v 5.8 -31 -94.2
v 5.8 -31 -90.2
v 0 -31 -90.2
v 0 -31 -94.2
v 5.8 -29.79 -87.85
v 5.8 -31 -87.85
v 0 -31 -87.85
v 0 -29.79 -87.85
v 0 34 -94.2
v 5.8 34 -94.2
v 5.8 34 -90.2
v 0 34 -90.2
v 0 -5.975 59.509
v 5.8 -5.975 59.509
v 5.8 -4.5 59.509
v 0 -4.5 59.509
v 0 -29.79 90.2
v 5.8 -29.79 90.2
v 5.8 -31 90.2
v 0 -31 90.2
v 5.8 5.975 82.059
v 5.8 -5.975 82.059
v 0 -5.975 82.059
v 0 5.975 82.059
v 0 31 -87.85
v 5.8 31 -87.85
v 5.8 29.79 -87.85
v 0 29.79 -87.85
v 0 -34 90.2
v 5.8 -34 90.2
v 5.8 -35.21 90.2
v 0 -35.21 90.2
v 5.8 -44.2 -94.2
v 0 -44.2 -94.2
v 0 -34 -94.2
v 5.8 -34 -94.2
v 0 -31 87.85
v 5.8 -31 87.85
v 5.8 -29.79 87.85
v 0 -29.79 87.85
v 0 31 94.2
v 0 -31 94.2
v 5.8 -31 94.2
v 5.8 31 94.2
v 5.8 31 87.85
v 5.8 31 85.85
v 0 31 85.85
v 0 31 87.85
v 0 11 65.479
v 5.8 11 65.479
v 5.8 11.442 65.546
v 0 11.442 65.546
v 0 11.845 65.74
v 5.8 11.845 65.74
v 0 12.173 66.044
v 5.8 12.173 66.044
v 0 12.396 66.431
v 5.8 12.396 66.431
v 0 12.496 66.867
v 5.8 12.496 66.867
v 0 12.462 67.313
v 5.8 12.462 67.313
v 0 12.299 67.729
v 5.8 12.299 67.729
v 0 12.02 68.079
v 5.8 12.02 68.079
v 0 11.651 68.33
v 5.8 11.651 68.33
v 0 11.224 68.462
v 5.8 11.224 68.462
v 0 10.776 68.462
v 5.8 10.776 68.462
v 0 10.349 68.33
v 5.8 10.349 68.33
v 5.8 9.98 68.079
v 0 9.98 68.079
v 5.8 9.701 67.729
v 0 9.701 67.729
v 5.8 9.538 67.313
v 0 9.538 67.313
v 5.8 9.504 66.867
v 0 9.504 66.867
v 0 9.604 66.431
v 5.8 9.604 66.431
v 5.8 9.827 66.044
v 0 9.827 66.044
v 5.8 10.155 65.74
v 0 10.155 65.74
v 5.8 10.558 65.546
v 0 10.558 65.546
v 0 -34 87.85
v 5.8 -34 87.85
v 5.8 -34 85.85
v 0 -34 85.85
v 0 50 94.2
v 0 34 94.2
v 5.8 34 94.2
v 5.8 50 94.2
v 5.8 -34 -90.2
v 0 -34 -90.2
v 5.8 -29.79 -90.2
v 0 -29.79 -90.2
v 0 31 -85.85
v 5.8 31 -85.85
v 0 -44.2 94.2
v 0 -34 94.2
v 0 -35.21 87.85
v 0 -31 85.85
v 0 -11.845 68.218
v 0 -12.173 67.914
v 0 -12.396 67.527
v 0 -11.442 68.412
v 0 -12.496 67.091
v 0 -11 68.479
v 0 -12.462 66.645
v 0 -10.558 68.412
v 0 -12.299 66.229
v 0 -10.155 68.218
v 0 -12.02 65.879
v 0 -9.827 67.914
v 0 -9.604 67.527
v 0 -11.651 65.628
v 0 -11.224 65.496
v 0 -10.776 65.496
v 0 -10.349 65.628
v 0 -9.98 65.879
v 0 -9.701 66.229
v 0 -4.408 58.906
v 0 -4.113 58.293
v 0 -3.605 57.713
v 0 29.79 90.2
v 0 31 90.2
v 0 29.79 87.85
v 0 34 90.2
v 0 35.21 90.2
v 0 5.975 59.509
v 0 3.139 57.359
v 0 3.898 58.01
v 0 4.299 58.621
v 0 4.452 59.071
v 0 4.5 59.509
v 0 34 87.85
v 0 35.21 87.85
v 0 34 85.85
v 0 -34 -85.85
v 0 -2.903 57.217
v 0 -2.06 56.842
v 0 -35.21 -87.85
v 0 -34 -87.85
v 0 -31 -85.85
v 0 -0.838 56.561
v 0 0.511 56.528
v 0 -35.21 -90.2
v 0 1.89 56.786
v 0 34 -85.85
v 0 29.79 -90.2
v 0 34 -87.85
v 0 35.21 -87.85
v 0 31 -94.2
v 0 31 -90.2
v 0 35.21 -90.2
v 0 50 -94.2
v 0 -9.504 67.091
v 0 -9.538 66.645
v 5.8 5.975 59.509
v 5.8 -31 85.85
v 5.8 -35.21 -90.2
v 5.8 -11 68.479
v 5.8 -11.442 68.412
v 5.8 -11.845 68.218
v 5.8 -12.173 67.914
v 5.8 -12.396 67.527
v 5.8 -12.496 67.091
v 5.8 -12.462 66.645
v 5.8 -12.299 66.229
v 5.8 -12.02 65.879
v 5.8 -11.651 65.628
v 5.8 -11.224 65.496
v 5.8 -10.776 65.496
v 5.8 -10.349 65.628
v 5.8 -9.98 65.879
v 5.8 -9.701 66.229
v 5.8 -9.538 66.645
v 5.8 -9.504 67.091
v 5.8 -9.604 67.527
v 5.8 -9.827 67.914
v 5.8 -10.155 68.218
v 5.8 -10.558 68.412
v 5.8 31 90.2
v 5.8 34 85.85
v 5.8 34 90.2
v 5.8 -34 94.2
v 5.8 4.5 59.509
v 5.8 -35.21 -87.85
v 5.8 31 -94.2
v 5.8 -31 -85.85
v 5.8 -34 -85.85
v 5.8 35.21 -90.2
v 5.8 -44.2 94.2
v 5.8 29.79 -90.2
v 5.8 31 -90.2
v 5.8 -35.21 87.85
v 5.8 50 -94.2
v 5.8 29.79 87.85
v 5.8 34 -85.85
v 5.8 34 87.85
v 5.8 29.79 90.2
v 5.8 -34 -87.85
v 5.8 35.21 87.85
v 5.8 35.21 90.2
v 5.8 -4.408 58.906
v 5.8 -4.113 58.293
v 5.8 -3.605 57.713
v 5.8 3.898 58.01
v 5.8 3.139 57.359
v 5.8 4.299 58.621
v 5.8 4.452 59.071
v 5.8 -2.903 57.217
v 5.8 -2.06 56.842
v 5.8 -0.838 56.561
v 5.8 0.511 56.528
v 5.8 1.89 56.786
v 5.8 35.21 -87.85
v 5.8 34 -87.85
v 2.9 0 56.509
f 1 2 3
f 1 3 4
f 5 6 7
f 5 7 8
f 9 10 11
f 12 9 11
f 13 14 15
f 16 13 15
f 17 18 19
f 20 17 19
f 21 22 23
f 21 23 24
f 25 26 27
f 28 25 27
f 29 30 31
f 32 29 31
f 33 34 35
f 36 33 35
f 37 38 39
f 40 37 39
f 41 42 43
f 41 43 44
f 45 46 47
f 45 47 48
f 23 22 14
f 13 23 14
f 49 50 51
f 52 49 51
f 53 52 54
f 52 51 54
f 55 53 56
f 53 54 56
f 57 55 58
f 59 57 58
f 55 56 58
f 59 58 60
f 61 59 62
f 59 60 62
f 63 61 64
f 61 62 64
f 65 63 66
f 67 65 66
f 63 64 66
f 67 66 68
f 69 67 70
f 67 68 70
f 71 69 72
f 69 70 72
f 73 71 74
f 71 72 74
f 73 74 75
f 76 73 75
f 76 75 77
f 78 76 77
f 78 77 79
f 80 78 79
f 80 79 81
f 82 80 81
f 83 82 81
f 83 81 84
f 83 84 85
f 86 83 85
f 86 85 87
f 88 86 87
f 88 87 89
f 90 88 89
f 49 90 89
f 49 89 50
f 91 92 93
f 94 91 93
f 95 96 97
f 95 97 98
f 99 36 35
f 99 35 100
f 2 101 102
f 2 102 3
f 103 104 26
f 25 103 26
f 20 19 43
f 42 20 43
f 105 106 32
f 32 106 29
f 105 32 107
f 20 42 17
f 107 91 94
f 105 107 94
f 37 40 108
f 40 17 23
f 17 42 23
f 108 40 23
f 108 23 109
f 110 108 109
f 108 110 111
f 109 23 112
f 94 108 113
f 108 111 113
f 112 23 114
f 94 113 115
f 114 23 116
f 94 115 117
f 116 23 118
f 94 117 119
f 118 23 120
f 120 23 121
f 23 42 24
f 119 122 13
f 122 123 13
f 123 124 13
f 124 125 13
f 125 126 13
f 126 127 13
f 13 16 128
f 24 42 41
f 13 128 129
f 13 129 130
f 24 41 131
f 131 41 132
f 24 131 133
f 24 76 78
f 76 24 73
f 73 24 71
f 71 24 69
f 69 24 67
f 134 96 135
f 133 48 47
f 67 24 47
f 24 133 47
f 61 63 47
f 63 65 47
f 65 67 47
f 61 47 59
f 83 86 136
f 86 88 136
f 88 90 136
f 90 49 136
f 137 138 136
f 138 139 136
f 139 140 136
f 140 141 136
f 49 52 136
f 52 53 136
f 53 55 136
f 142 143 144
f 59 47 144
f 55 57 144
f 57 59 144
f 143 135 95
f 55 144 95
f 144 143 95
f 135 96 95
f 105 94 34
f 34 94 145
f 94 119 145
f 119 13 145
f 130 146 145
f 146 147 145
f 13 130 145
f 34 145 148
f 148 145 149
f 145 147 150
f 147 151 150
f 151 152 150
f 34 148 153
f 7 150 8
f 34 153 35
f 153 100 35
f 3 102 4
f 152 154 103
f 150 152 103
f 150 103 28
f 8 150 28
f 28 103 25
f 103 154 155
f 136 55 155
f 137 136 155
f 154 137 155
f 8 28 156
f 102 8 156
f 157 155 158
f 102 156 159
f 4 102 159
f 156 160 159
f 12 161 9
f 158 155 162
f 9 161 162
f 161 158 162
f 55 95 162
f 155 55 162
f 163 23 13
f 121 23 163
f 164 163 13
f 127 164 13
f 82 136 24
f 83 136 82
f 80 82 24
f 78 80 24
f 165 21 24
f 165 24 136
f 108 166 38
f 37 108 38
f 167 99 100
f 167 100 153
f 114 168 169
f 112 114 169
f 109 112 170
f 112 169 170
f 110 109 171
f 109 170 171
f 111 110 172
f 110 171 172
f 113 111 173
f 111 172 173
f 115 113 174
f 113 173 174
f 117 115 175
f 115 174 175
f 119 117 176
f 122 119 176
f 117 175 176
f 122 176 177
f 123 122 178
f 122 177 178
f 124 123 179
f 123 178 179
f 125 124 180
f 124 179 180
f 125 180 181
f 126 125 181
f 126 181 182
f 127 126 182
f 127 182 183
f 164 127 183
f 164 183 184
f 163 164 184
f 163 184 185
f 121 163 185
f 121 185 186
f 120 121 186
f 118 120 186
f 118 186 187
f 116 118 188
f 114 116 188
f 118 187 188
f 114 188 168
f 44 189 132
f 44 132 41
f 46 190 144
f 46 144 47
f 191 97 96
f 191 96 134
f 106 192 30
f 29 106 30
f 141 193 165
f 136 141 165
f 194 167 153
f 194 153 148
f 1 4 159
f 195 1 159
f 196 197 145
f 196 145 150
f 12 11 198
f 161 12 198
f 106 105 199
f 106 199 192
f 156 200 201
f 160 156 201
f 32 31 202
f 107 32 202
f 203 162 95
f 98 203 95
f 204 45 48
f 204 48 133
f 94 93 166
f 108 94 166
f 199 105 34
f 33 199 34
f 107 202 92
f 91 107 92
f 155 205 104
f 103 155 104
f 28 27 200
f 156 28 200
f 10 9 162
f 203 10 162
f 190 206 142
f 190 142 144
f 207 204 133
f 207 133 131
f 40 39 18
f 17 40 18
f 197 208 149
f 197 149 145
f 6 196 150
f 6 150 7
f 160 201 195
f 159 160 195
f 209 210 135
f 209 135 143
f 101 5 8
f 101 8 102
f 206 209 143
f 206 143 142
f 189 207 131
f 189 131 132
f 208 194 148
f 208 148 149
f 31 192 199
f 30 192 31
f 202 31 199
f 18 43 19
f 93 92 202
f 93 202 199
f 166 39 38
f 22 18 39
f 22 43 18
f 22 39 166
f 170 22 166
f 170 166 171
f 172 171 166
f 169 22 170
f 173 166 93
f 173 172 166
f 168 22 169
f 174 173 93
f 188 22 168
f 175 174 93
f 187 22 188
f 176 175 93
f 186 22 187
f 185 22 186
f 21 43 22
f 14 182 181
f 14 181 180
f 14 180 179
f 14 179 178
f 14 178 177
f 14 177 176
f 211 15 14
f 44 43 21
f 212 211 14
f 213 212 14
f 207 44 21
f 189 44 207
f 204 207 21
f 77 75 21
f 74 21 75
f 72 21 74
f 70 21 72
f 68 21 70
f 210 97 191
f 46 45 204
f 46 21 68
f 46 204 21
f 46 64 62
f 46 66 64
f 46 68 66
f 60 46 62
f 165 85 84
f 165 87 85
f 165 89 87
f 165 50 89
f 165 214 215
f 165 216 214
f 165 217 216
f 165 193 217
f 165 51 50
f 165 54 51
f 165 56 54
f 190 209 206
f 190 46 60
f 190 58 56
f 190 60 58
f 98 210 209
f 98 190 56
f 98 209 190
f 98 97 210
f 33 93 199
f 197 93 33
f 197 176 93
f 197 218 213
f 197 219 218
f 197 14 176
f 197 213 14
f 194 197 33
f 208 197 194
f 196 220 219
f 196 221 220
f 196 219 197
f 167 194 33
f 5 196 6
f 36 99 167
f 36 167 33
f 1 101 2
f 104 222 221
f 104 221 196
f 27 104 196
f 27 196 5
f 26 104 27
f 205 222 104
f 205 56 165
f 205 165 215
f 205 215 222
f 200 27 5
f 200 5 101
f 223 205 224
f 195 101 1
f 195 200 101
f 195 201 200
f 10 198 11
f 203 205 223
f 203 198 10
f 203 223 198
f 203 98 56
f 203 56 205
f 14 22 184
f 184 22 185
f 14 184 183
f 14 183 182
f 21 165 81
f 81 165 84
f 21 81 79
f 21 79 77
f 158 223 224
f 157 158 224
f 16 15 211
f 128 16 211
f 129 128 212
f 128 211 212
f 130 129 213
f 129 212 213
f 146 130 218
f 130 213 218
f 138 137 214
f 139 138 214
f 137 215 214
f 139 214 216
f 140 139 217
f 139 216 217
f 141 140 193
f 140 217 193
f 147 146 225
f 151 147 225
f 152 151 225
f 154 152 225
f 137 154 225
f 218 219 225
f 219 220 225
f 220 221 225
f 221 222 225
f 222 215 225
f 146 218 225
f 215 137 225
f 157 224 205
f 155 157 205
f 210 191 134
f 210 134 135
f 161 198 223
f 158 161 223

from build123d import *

# Parameters (mm, degrees)
BOSS_EXTRUDE1_OUTLINE_W   = 188.4
BOSS_EXTRUDE1_OUTLINE_H   = 88.4
BOSS_EXTRUDE1_DEPTH       = 5.8
BOSS_EXTRUDE1_2_OUTLINE_R = 1.5
BOSS_EXTRUDE1_2_OUTLINE_W = 22.55
BOSS_EXTRUDE1_2_OUTLINE_H = 11.95
BOSS_EXTRUDE1_2_DEPTH     = 5.8
SKETCH2_W                 = 22.55
SKETCH2_H                 = 11.95
CUT_EXTRUDE1_DEPTH        = 6.35
SKETCH3_R                 = 1.5
SKETCH3_W                 = 22.55
SKETCH3_H                 = 11.95
CUT_EXTRUDE2_DEPTH        = 107.804868803
CUT_EXTRUDE3_DEPTH        = 107.804868803
SKETCH5_W                 = 5.8
SKETCH5_H                 = 188.4
BOSS_EXTRUDE2_DEPTH       = 5.8
CUT_EXTRUDE5_DEPTH        = 5.8


# Read off the part's stored shape, not the designer's step: Boss-Extrude1
with BuildPart() as part:
    # Boss-Extrude1 outline → Boss-Extrude1 (new body)
    with BuildSketch(Plane(origin=(0, 0, 0), x_dir=(0, 0, -1), z_dir=(1, 0, 0))):
        Rectangle(BOSS_EXTRUDE1_OUTLINE_W, BOSS_EXTRUDE1_OUTLINE_H)
    extrude(amount=BOSS_EXTRUDE1_DEPTH)

    # Sketch2 → Cut-Extrude1 (cut)
    with BuildSketch(Plane(origin=(5.8, 0, 0), x_dir=(0, 0, -1), z_dir=(1, 0, 0))):
        with Locations((-70.783988916, 0)):
            Rectangle(SKETCH2_W, SKETCH2_H)
    extrude(amount=-CUT_EXTRUDE1_DEPTH, mode=Mode.SUBTRACT)

    # Sketch3 → Cut-Extrude2 (cut, through all)
    with BuildSketch(Plane(origin=(5.8, 0, 0), x_dir=(0, 0, -1), z_dir=(1, 0, 0))):
        with Locations((-66.978988916, 11)):
            Circle(SKETCH3_R)
        with Locations(Location((-66.978988916, -11, 0), (0, 0, 180))):
            Circle(SKETCH3_R)
        with Locations((-70.783988916, 0)):
            Rectangle(SKETCH3_W, SKETCH3_H)
    extrude(amount=-CUT_EXTRUDE2_DEPTH, mode=Mode.SUBTRACT)

    # Sketch4 → Cut-Extrude3 (cut, through all)
    with BuildSketch(Plane(origin=(5.8, 0, 0), x_dir=(0, 0, -1), z_dir=(1, 0, 0))):
        Polygon((-94.2, 34), (-90.2, 34), (-90.2, 35.21), (-87.85, 35.21), (-87.85, 34), (-85.85, 34), (-85.85, 31), (-87.85, 31), (-87.85, 29.79), (-90.2, 29.79), (-90.2, 31), (-94.2, 31), align=None)
        Polygon((-87.85, -31), (-87.85, -29.79), (-90.2, -29.79), (-90.2, -31), (-94.2, -31), (-94.2, -34), (-90.2, -34), (-90.2, -35.21), (-87.85, -35.21), (-87.85, -34), (-85.85, -34), (-85.85, -31), align=None)
        Polygon((94.2, -34), (90.2, -34), (90.2, -35.21), (87.85, -35.21), (87.85, -34), (85.85, -34), (85.85, -31), (87.85, -31), (87.85, -29.79), (90.2, -29.79), (90.2, -31), (94.2, -31), align=None)
        Polygon((87.85, 31), (87.85, 29.79), (90.2, 29.79), (90.2, 31), (94.2, 31), (94.2, 34), (90.2, 34), (90.2, 35.21), (87.85, 35.21), (87.85, 34), (85.85, 34), (85.85, 31), align=None)
    extrude(amount=-CUT_EXTRUDE3_DEPTH, mode=Mode.SUBTRACT)



with BuildPart() as body_2:
    # Boss-Extrude1 2 outline → Boss-Extrude1 2 (new body)
    with BuildSketch(Plane(origin=(0, 0, 0), x_dir=(0, 0, -1), z_dir=(1, 0, 0))):
        Polygon((94.2, 34), (94.2, 50), (-94.2, 50), (-94.2, 34), (-90.2, 34), (-90.2, 35.21), (-87.85, 35.21), (-87.85, 34), (-85.85, 34), (-85.85, 31), (-87.85, 31), (-87.85, 29.79), (-90.2, 29.79), (-90.2, 31), (-94.2, 31), (-94.2, -31), (-90.2, -31), (-90.2, -29.79), (-87.85, -29.79), (-87.85, -31), (-85.85, -31), (-85.85, -34), (-87.85, -34), (-87.85, -35.21), (-90.2, -35.21), (-90.2, -34), (-94.2, -34), (-94.2, -44.2), (94.2, -44.2), (94.2, -34), (90.2, -34), (90.2, -35.21), (87.85, -35.21), (87.85, -34), (85.85, -34), (85.85, -31), (87.85, -31), (87.85, -29.79), (90.2, -29.79), (90.2, -31), (94.2, -31), (94.2, 31), (90.2, 31), (90.2, 29.79), (87.85, 29.79), (87.85, 31), (85.85, 31), (85.85, 34), (87.85, 34), (87.85, 35.21), (90.2, 35.21), (90.2, 34), align=None)
        with Locations((-66.978988916, -11)):
            Circle(BOSS_EXTRUDE1_2_OUTLINE_R, mode=Mode.SUBTRACT)
        with Locations((-70.783988916, 0)):
            Rectangle(BOSS_EXTRUDE1_2_OUTLINE_W, BOSS_EXTRUDE1_2_OUTLINE_H, mode=Mode.SUBTRACT)
        with Locations((-66.978988916, 11)):
            Circle(BOSS_EXTRUDE1_2_OUTLINE_R, mode=Mode.SUBTRACT)
    extrude(amount=BOSS_EXTRUDE1_2_DEPTH)


with BuildPart() as part_1:
    add(part.part)

    add(body_2.part)  # Boss-Extrude2 merges body 2
    # Sketch5 → Boss-Extrude2 (add)
    with BuildSketch(Plane(origin=(0, 44.2, 0), x_dir=(1, 0, 0), z_dir=(0, 1, 0))):
        with Locations((2.9, 0)):
            Rectangle(SKETCH5_W, SKETCH5_H)
    extrude(amount=BOSS_EXTRUDE2_DEPTH)

    # Sketch8 → Cut-Extrude5 (cut)
    with BuildSketch(Plane(origin=(5.8, 0, 0), x_dir=(0, 0, -1), z_dir=(1, 0, 0))):
        with BuildLine():
            Line((-59.508988916, 4.5), (-59.508988916, -4.5))
            add(Edge.make_bspline(
                [(-59.508988916, -4.5), (-56.508988916, -4.5), (-56.508988916, 0), (-56.508988916, 4.5), (-59.508988916, 4.5)],
                knots=[3.141592654, 3.141592654, 3.141592654, 4.71238898, 4.71238898, 6.283185307, 6.283185307, 6.283185307], degree=2, weights=[1, 0.707106781, 1, 0.707106781, 1]))
        make_face()
    extrude(amount=-CUT_EXTRUDE5_DEPTH, mode=Mode.SUBTRACT)


solid = part_1.part
